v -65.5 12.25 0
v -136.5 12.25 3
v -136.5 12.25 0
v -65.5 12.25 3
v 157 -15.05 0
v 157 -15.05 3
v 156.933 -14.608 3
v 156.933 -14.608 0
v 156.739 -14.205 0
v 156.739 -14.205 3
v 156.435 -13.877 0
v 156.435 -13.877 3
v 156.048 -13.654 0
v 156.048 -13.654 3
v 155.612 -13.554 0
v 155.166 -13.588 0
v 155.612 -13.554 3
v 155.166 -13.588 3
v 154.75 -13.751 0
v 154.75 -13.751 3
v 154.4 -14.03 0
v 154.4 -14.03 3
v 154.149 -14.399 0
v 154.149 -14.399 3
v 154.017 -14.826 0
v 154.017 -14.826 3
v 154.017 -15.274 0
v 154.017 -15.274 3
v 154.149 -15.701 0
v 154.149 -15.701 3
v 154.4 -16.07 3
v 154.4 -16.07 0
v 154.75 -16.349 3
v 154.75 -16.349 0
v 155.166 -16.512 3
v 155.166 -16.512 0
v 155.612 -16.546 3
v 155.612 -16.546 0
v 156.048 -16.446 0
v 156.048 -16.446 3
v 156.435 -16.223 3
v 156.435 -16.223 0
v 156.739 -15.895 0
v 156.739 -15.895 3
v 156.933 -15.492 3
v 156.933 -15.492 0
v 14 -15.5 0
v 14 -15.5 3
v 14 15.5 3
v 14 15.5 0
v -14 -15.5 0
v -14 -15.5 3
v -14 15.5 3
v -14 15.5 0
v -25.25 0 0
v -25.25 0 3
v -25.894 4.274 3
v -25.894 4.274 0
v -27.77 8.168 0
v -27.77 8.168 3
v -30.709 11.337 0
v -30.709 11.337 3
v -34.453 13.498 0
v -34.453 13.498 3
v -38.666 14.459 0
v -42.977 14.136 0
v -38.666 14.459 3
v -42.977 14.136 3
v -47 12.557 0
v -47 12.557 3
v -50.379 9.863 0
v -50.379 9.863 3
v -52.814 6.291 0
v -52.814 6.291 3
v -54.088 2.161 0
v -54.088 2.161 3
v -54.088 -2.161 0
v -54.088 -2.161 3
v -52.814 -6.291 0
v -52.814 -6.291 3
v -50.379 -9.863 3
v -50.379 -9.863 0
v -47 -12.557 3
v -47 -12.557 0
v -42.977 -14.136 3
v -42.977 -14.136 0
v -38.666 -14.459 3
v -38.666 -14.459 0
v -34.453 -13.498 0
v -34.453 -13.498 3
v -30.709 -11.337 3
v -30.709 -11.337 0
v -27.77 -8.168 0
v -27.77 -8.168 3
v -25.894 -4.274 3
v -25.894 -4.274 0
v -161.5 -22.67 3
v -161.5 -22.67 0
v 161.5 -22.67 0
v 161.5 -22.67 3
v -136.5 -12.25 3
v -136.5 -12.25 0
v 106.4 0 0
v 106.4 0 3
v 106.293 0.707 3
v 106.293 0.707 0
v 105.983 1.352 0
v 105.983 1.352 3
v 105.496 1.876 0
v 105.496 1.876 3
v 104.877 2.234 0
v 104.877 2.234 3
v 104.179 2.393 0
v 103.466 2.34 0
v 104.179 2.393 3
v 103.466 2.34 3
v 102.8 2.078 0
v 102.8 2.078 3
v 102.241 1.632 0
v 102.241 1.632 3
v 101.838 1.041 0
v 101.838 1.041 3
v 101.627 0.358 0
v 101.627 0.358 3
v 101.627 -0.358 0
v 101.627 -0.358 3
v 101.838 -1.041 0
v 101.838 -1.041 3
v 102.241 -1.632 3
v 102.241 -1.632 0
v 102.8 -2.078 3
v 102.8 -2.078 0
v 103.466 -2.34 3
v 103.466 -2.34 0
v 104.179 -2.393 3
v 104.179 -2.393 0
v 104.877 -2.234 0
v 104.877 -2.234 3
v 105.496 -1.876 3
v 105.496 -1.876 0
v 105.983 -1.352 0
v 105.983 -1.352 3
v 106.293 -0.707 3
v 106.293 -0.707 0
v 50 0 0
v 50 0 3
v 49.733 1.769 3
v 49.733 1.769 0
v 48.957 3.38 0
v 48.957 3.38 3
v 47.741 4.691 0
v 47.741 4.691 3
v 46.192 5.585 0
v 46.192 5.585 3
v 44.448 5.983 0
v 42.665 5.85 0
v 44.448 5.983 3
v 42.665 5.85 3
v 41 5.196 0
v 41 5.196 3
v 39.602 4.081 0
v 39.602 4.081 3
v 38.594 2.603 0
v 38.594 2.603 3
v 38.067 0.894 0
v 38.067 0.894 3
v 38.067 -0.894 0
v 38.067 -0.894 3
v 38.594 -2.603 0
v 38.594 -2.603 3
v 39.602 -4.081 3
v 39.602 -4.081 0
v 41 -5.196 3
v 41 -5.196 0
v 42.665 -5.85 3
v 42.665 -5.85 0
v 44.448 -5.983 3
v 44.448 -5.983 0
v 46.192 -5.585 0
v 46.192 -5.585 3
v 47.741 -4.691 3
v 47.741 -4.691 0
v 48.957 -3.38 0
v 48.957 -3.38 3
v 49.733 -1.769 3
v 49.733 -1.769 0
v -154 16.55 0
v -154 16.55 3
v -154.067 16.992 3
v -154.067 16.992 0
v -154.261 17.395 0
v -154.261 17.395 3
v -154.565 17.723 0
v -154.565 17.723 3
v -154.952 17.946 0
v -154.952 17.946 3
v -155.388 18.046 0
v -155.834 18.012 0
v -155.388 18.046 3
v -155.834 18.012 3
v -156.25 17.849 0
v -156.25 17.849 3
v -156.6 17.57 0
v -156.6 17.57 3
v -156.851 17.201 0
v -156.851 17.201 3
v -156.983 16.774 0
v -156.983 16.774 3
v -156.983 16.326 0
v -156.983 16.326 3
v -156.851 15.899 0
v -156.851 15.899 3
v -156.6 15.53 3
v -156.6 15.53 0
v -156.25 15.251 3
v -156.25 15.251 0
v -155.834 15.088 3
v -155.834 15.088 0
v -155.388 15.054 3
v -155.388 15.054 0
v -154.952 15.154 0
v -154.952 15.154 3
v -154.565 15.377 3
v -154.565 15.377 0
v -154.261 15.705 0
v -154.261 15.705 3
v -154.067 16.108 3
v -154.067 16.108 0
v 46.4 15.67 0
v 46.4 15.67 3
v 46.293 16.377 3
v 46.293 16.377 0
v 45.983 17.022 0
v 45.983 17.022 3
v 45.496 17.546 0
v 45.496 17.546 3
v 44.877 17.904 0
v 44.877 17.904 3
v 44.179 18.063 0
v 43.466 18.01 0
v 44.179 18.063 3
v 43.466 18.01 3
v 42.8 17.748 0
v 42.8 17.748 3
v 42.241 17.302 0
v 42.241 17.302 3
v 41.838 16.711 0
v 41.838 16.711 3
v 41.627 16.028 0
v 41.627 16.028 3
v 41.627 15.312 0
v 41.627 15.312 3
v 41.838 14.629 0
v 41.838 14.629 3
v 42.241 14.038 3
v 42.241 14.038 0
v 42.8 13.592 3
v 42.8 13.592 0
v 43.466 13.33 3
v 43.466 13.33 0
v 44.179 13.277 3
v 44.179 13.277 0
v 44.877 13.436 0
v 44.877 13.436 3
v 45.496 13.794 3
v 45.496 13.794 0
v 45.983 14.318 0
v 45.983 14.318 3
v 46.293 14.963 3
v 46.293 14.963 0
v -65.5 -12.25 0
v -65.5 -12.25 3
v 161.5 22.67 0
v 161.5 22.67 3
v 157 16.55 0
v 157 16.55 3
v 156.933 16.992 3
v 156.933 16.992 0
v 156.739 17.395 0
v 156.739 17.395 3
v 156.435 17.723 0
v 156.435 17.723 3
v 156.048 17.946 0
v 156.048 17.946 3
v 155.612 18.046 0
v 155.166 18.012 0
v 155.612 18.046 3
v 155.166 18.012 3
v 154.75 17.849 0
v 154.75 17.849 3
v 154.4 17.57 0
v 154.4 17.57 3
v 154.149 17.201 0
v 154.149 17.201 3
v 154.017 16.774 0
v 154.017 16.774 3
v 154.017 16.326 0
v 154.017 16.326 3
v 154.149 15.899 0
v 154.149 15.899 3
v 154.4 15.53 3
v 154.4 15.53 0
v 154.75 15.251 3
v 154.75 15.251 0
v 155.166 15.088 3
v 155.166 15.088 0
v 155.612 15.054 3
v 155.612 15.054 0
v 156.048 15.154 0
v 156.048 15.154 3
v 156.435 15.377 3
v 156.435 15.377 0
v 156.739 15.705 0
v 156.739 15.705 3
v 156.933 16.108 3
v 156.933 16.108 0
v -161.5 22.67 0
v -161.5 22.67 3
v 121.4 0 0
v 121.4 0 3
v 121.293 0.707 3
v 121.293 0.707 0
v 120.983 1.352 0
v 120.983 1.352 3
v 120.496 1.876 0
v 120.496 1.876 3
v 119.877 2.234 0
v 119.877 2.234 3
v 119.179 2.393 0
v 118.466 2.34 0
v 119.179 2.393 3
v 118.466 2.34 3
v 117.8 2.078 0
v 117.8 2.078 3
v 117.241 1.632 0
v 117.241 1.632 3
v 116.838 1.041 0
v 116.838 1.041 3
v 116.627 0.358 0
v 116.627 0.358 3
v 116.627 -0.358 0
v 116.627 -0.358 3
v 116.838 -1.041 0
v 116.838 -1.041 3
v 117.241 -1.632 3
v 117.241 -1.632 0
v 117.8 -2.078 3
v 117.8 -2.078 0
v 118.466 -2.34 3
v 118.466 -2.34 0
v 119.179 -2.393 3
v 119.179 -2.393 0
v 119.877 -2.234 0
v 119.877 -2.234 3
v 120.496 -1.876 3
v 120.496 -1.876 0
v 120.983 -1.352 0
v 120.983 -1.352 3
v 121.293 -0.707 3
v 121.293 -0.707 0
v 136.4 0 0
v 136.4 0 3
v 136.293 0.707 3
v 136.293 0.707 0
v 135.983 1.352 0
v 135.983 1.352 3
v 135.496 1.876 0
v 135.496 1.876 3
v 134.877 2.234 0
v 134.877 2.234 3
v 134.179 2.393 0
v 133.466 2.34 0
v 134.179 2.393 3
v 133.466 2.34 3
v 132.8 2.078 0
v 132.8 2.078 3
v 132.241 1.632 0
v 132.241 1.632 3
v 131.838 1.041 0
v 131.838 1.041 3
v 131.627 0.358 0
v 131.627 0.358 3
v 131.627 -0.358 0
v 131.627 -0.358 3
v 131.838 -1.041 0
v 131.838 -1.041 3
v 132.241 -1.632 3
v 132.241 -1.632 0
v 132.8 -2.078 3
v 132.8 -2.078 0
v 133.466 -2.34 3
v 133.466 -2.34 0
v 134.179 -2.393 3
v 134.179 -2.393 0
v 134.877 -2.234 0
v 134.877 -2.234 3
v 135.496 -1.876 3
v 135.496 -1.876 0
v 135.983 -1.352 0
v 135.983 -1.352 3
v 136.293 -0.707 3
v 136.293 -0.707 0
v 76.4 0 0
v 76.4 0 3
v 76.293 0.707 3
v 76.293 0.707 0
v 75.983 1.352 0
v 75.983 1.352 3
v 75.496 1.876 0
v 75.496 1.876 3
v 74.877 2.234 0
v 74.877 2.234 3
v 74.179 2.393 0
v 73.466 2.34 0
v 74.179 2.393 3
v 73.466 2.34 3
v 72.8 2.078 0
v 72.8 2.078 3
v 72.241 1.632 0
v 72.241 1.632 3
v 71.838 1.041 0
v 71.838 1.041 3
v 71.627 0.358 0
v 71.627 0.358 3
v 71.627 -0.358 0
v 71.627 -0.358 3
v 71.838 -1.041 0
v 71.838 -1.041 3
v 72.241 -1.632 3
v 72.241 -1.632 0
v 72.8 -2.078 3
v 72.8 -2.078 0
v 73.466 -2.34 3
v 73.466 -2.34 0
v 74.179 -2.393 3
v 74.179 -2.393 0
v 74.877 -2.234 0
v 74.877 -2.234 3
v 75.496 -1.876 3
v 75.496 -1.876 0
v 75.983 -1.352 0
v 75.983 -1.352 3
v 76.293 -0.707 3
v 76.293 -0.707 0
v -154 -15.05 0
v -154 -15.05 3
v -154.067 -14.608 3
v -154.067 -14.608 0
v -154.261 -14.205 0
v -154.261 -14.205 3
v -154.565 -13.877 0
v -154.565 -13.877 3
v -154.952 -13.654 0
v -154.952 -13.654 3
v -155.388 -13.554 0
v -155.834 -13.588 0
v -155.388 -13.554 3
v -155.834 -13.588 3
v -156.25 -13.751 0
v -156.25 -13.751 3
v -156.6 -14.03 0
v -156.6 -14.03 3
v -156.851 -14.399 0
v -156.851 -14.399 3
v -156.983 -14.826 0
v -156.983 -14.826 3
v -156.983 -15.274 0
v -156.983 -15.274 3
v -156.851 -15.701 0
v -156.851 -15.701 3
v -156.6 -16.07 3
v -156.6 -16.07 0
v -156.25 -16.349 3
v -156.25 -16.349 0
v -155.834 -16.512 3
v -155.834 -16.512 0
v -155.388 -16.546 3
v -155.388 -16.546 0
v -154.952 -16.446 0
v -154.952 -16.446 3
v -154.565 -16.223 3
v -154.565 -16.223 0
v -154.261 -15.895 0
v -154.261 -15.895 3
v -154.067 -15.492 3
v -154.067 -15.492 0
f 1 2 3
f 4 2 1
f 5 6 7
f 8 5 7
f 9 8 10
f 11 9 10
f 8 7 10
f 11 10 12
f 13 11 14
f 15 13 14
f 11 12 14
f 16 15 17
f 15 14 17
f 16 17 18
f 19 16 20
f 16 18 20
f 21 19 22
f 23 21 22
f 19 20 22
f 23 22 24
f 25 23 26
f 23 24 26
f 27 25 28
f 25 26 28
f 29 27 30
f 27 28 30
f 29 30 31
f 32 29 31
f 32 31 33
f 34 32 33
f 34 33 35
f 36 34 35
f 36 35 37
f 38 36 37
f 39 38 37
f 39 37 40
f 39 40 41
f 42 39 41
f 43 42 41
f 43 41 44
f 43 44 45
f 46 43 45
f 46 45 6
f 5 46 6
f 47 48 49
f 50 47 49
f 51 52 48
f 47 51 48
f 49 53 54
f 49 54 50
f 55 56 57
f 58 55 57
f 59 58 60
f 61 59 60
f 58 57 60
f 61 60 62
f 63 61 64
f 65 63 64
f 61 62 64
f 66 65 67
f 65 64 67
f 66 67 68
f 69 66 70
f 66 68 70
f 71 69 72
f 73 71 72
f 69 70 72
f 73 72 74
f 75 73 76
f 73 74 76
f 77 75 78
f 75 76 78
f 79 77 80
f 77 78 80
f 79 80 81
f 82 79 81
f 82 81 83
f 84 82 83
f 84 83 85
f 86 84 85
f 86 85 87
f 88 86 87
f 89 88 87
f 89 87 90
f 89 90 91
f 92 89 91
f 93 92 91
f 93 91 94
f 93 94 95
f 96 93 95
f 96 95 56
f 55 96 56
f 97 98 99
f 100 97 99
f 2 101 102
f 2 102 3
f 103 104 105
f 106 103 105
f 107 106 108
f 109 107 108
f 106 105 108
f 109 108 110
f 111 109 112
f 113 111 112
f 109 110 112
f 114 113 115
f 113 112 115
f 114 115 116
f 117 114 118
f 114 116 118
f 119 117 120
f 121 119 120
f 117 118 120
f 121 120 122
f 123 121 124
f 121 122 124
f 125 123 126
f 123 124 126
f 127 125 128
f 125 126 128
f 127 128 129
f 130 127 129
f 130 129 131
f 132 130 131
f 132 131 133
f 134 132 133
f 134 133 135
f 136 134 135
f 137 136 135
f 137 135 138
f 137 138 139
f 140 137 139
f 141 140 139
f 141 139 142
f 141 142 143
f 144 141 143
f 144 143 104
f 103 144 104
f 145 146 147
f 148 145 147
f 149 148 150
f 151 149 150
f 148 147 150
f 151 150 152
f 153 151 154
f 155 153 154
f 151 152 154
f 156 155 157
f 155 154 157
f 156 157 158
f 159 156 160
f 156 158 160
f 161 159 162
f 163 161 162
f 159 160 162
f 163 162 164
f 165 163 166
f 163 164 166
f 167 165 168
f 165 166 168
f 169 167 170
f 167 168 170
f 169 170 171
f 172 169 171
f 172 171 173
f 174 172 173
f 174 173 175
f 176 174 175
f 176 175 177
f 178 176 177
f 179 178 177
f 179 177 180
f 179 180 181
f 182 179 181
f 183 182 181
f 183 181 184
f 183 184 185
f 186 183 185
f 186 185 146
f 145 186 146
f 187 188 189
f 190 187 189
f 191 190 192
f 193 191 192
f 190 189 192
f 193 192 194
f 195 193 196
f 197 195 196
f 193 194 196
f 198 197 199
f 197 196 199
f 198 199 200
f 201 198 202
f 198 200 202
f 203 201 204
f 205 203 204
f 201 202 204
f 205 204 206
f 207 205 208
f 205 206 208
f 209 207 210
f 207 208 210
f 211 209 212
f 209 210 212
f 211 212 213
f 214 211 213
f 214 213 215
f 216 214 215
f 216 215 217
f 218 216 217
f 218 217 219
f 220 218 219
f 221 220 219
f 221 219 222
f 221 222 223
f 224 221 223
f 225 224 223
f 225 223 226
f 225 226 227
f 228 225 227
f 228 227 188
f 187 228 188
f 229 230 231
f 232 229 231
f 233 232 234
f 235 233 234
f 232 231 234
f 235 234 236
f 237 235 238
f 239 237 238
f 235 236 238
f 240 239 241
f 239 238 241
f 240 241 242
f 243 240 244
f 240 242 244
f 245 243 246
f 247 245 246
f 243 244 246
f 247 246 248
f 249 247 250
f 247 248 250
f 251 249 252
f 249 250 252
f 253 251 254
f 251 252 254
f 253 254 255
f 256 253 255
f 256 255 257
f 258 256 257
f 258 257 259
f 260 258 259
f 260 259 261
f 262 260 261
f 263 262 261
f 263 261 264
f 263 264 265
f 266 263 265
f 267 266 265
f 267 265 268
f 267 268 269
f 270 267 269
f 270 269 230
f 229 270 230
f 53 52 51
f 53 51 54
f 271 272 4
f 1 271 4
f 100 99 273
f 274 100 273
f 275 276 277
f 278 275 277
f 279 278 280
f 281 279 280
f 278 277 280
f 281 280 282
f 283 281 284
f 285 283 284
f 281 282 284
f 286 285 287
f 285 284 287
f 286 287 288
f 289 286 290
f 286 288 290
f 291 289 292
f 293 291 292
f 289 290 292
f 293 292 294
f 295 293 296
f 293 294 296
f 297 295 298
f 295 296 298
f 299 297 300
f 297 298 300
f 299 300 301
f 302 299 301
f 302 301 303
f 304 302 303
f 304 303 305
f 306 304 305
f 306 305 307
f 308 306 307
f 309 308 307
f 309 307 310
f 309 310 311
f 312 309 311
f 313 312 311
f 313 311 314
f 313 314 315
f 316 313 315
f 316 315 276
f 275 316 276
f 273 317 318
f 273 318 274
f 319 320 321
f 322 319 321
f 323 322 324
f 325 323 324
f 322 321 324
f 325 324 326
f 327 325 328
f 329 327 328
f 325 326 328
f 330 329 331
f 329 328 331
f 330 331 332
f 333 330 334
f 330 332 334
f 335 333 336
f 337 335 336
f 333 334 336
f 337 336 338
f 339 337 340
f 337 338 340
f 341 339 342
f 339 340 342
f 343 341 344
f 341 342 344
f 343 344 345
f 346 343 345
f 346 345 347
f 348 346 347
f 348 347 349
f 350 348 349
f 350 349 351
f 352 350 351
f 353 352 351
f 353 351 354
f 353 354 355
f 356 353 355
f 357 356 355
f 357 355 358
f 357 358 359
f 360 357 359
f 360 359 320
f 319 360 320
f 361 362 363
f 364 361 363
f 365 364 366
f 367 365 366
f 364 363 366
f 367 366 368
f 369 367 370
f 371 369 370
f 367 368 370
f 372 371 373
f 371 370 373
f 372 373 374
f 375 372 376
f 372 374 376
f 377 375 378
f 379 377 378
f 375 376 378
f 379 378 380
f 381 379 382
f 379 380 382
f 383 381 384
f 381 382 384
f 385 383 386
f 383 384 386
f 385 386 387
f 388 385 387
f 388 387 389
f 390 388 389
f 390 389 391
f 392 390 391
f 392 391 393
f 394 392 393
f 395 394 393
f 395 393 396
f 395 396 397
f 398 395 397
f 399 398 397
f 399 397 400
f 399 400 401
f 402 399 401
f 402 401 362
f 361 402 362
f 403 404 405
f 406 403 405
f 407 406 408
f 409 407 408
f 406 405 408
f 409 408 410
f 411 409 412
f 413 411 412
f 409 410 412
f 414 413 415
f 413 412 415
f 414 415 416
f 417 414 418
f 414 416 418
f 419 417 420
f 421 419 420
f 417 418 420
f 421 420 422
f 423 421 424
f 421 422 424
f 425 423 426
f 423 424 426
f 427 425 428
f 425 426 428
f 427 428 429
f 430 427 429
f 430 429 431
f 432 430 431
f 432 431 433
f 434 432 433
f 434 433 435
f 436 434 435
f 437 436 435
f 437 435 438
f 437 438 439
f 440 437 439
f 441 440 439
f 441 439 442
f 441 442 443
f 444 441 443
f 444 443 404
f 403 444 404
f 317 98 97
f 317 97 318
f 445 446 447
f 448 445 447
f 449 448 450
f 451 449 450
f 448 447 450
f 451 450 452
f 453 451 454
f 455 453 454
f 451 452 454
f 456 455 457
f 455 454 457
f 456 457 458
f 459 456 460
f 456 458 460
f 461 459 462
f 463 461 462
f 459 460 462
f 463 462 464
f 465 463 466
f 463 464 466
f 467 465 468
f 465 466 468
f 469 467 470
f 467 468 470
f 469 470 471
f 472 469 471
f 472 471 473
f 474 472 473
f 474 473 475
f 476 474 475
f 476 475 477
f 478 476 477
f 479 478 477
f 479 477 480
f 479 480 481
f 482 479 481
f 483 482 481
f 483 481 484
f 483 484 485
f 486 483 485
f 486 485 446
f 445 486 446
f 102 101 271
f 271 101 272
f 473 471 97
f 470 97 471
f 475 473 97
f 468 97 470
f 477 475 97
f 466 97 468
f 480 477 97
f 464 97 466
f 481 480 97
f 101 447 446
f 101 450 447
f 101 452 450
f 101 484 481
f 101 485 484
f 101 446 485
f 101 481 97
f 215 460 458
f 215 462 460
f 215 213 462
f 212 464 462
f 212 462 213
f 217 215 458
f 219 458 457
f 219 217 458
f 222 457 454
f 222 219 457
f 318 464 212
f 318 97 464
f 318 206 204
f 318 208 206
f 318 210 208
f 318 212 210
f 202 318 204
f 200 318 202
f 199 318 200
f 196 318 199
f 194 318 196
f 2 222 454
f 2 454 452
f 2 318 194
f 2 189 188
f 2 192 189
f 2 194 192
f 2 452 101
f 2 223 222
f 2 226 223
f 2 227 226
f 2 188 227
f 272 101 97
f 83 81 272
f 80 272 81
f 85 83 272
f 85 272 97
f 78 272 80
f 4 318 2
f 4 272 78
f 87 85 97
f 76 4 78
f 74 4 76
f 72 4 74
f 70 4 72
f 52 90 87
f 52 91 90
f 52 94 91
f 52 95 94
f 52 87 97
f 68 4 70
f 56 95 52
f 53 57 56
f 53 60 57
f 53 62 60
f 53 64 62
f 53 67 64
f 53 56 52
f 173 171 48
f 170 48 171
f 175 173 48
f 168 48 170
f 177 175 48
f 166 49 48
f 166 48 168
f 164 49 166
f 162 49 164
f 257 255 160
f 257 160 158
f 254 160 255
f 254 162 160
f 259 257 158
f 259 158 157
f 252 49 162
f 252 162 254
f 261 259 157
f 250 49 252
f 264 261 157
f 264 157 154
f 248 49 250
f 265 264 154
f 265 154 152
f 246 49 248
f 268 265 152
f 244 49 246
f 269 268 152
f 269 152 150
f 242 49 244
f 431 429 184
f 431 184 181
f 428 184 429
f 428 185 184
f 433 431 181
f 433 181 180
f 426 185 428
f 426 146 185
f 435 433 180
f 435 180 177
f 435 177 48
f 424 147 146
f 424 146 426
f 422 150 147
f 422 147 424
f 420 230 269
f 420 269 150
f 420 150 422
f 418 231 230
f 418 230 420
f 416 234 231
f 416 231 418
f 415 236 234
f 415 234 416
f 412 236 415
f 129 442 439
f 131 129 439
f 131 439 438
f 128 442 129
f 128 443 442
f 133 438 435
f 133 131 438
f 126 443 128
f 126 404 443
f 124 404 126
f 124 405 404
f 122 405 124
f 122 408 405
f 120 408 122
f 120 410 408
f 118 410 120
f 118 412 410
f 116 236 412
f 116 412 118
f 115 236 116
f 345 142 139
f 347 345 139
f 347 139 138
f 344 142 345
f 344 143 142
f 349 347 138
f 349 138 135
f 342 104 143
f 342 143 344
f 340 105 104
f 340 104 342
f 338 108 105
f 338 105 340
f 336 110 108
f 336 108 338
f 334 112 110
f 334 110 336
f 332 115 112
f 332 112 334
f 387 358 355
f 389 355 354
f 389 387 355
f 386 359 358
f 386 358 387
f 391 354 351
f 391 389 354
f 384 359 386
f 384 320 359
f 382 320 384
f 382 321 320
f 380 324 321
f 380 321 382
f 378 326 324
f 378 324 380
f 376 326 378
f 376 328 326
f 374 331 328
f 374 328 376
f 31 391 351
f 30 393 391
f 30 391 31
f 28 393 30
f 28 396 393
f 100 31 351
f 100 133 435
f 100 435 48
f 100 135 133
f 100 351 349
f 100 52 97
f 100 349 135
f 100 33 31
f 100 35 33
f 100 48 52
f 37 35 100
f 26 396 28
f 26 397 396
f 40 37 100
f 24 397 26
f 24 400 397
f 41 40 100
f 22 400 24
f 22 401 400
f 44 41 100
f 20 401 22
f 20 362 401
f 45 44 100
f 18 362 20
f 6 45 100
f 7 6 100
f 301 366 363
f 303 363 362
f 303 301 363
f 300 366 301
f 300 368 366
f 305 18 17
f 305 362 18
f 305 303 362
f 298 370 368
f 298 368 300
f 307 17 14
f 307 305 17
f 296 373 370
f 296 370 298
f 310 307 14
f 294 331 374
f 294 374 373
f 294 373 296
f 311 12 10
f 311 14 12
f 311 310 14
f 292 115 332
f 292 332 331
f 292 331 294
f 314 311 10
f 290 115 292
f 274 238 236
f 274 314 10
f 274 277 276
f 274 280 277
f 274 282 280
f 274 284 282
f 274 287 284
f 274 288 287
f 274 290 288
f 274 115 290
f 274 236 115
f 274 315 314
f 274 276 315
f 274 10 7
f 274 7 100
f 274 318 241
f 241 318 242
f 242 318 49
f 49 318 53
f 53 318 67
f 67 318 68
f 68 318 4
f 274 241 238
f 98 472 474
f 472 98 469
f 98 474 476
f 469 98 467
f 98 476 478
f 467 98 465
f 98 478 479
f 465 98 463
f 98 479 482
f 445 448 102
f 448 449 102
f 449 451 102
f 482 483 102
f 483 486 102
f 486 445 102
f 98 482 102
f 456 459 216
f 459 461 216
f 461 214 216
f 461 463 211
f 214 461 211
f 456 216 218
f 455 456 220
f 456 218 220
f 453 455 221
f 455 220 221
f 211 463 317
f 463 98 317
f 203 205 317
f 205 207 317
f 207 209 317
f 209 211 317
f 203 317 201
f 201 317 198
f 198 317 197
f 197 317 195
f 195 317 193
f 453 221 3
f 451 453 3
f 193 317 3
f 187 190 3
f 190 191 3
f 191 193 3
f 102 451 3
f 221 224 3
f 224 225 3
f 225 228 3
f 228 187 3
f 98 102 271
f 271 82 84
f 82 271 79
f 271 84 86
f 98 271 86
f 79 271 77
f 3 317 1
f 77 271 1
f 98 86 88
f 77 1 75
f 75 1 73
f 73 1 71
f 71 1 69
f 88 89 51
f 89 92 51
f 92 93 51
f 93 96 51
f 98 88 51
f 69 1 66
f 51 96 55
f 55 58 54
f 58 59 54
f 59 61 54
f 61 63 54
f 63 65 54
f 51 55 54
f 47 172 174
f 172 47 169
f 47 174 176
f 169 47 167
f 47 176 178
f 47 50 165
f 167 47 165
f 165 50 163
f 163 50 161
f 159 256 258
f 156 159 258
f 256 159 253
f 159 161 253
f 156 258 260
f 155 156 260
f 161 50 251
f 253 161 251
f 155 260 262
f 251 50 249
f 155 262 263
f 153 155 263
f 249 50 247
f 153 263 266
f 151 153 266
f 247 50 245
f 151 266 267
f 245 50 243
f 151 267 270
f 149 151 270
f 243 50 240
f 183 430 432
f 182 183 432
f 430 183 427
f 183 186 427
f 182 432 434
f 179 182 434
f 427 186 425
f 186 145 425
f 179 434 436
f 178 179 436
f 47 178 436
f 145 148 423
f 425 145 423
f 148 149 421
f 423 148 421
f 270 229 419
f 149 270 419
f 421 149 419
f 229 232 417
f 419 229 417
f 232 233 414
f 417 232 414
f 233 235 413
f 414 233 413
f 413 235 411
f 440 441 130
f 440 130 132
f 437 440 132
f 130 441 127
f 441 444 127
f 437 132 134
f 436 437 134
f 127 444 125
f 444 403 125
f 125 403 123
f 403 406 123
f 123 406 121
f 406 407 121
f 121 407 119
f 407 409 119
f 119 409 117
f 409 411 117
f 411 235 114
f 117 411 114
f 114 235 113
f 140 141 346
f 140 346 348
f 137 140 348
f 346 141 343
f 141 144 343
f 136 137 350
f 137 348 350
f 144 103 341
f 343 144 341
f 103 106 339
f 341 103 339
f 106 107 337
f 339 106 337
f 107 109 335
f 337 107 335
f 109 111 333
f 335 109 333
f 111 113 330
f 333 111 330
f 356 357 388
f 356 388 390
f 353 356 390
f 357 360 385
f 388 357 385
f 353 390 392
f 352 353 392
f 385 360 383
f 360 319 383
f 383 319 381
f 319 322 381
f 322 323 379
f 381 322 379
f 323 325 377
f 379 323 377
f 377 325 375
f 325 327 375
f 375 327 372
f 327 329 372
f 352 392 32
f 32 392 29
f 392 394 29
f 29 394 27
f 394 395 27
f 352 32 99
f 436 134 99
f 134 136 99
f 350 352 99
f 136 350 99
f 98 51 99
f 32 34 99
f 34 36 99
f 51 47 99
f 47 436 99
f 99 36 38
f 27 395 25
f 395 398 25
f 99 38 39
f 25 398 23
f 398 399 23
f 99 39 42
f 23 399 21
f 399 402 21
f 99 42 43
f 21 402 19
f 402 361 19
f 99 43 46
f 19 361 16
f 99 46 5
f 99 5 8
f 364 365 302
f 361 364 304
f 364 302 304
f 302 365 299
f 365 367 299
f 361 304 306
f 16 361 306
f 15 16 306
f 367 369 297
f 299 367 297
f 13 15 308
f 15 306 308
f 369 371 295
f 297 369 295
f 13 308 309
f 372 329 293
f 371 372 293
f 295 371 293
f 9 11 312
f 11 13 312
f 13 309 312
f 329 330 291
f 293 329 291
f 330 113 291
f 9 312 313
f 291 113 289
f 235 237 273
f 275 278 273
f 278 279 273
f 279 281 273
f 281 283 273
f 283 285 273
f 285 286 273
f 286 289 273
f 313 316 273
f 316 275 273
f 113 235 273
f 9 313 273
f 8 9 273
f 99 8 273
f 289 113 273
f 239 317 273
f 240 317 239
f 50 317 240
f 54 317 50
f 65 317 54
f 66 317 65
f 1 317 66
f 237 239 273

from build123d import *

# Parameters (mm, degrees)
SKETCH1_W               = 323
SKETCH1_H               = 45.34
BOSS_EXTRUDE1_DEPTH     = 3
SKETCH2_R               = 6
SKETCH2_R_2             = 2.4
SKETCH2_R_3             = 14.5
SKETCH2_R_4             = 1.5
SKETCH2_W               = 71
SKETCH2_H               = 24.5
SKETCH2_W_2             = 28
SKETCH2_H_2             = 31
CUT_EXTRUDE1_DEPTH      = 1
CUT_EXTRUDE1_DEPTH_BACK = 4


with BuildPart() as part:
    # Sketch1 → Boss-Extrude1 (new body)
    with BuildSketch(Plane.XY):
        Rectangle(SKETCH1_W, SKETCH1_H)
    extrude(amount=BOSS_EXTRUDE1_DEPTH)

    # Sketch2 → Cut-Extrude1 (cut, two sides)
    with BuildSketch(Plane.XY.offset(3)) as cut_extrude1_sk:
        with Locations((44, 0)):
            Circle(SKETCH2_R)
        with Locations((74, 0)):
            Circle(SKETCH2_R_2)
        with Locations((44, 15.67)):
            Circle(SKETCH2_R_2)
        with Locations((134, 0)):
            Circle(SKETCH2_R_2)
        with Locations((119, 0)):
            Circle(SKETCH2_R_2)
        with Locations((104, 0)):
            Circle(SKETCH2_R_2)
        with Locations((-39.75, 0)):
            Circle(SKETCH2_R_3)
        with Locations((-155.5, 16.55)):
            Circle(SKETCH2_R_4)
        with Locations((-155.5, -15.05)):
            Circle(SKETCH2_R_4)
        with Locations((155.5, -15.05)):
            Circle(SKETCH2_R_4)
        with Locations((155.5, 16.55)):
            Circle(SKETCH2_R_4)
        with Locations((-101, 0)):
            Rectangle(SKETCH2_W, SKETCH2_H)
        Rectangle(SKETCH2_W_2, SKETCH2_H_2)
    extrude(amount=CUT_EXTRUDE1_DEPTH, mode=Mode.SUBTRACT)
    extrude(cut_extrude1_sk.sketch, amount=-CUT_EXTRUDE1_DEPTH_BACK, mode=Mode.SUBTRACT)


solid = part.part
